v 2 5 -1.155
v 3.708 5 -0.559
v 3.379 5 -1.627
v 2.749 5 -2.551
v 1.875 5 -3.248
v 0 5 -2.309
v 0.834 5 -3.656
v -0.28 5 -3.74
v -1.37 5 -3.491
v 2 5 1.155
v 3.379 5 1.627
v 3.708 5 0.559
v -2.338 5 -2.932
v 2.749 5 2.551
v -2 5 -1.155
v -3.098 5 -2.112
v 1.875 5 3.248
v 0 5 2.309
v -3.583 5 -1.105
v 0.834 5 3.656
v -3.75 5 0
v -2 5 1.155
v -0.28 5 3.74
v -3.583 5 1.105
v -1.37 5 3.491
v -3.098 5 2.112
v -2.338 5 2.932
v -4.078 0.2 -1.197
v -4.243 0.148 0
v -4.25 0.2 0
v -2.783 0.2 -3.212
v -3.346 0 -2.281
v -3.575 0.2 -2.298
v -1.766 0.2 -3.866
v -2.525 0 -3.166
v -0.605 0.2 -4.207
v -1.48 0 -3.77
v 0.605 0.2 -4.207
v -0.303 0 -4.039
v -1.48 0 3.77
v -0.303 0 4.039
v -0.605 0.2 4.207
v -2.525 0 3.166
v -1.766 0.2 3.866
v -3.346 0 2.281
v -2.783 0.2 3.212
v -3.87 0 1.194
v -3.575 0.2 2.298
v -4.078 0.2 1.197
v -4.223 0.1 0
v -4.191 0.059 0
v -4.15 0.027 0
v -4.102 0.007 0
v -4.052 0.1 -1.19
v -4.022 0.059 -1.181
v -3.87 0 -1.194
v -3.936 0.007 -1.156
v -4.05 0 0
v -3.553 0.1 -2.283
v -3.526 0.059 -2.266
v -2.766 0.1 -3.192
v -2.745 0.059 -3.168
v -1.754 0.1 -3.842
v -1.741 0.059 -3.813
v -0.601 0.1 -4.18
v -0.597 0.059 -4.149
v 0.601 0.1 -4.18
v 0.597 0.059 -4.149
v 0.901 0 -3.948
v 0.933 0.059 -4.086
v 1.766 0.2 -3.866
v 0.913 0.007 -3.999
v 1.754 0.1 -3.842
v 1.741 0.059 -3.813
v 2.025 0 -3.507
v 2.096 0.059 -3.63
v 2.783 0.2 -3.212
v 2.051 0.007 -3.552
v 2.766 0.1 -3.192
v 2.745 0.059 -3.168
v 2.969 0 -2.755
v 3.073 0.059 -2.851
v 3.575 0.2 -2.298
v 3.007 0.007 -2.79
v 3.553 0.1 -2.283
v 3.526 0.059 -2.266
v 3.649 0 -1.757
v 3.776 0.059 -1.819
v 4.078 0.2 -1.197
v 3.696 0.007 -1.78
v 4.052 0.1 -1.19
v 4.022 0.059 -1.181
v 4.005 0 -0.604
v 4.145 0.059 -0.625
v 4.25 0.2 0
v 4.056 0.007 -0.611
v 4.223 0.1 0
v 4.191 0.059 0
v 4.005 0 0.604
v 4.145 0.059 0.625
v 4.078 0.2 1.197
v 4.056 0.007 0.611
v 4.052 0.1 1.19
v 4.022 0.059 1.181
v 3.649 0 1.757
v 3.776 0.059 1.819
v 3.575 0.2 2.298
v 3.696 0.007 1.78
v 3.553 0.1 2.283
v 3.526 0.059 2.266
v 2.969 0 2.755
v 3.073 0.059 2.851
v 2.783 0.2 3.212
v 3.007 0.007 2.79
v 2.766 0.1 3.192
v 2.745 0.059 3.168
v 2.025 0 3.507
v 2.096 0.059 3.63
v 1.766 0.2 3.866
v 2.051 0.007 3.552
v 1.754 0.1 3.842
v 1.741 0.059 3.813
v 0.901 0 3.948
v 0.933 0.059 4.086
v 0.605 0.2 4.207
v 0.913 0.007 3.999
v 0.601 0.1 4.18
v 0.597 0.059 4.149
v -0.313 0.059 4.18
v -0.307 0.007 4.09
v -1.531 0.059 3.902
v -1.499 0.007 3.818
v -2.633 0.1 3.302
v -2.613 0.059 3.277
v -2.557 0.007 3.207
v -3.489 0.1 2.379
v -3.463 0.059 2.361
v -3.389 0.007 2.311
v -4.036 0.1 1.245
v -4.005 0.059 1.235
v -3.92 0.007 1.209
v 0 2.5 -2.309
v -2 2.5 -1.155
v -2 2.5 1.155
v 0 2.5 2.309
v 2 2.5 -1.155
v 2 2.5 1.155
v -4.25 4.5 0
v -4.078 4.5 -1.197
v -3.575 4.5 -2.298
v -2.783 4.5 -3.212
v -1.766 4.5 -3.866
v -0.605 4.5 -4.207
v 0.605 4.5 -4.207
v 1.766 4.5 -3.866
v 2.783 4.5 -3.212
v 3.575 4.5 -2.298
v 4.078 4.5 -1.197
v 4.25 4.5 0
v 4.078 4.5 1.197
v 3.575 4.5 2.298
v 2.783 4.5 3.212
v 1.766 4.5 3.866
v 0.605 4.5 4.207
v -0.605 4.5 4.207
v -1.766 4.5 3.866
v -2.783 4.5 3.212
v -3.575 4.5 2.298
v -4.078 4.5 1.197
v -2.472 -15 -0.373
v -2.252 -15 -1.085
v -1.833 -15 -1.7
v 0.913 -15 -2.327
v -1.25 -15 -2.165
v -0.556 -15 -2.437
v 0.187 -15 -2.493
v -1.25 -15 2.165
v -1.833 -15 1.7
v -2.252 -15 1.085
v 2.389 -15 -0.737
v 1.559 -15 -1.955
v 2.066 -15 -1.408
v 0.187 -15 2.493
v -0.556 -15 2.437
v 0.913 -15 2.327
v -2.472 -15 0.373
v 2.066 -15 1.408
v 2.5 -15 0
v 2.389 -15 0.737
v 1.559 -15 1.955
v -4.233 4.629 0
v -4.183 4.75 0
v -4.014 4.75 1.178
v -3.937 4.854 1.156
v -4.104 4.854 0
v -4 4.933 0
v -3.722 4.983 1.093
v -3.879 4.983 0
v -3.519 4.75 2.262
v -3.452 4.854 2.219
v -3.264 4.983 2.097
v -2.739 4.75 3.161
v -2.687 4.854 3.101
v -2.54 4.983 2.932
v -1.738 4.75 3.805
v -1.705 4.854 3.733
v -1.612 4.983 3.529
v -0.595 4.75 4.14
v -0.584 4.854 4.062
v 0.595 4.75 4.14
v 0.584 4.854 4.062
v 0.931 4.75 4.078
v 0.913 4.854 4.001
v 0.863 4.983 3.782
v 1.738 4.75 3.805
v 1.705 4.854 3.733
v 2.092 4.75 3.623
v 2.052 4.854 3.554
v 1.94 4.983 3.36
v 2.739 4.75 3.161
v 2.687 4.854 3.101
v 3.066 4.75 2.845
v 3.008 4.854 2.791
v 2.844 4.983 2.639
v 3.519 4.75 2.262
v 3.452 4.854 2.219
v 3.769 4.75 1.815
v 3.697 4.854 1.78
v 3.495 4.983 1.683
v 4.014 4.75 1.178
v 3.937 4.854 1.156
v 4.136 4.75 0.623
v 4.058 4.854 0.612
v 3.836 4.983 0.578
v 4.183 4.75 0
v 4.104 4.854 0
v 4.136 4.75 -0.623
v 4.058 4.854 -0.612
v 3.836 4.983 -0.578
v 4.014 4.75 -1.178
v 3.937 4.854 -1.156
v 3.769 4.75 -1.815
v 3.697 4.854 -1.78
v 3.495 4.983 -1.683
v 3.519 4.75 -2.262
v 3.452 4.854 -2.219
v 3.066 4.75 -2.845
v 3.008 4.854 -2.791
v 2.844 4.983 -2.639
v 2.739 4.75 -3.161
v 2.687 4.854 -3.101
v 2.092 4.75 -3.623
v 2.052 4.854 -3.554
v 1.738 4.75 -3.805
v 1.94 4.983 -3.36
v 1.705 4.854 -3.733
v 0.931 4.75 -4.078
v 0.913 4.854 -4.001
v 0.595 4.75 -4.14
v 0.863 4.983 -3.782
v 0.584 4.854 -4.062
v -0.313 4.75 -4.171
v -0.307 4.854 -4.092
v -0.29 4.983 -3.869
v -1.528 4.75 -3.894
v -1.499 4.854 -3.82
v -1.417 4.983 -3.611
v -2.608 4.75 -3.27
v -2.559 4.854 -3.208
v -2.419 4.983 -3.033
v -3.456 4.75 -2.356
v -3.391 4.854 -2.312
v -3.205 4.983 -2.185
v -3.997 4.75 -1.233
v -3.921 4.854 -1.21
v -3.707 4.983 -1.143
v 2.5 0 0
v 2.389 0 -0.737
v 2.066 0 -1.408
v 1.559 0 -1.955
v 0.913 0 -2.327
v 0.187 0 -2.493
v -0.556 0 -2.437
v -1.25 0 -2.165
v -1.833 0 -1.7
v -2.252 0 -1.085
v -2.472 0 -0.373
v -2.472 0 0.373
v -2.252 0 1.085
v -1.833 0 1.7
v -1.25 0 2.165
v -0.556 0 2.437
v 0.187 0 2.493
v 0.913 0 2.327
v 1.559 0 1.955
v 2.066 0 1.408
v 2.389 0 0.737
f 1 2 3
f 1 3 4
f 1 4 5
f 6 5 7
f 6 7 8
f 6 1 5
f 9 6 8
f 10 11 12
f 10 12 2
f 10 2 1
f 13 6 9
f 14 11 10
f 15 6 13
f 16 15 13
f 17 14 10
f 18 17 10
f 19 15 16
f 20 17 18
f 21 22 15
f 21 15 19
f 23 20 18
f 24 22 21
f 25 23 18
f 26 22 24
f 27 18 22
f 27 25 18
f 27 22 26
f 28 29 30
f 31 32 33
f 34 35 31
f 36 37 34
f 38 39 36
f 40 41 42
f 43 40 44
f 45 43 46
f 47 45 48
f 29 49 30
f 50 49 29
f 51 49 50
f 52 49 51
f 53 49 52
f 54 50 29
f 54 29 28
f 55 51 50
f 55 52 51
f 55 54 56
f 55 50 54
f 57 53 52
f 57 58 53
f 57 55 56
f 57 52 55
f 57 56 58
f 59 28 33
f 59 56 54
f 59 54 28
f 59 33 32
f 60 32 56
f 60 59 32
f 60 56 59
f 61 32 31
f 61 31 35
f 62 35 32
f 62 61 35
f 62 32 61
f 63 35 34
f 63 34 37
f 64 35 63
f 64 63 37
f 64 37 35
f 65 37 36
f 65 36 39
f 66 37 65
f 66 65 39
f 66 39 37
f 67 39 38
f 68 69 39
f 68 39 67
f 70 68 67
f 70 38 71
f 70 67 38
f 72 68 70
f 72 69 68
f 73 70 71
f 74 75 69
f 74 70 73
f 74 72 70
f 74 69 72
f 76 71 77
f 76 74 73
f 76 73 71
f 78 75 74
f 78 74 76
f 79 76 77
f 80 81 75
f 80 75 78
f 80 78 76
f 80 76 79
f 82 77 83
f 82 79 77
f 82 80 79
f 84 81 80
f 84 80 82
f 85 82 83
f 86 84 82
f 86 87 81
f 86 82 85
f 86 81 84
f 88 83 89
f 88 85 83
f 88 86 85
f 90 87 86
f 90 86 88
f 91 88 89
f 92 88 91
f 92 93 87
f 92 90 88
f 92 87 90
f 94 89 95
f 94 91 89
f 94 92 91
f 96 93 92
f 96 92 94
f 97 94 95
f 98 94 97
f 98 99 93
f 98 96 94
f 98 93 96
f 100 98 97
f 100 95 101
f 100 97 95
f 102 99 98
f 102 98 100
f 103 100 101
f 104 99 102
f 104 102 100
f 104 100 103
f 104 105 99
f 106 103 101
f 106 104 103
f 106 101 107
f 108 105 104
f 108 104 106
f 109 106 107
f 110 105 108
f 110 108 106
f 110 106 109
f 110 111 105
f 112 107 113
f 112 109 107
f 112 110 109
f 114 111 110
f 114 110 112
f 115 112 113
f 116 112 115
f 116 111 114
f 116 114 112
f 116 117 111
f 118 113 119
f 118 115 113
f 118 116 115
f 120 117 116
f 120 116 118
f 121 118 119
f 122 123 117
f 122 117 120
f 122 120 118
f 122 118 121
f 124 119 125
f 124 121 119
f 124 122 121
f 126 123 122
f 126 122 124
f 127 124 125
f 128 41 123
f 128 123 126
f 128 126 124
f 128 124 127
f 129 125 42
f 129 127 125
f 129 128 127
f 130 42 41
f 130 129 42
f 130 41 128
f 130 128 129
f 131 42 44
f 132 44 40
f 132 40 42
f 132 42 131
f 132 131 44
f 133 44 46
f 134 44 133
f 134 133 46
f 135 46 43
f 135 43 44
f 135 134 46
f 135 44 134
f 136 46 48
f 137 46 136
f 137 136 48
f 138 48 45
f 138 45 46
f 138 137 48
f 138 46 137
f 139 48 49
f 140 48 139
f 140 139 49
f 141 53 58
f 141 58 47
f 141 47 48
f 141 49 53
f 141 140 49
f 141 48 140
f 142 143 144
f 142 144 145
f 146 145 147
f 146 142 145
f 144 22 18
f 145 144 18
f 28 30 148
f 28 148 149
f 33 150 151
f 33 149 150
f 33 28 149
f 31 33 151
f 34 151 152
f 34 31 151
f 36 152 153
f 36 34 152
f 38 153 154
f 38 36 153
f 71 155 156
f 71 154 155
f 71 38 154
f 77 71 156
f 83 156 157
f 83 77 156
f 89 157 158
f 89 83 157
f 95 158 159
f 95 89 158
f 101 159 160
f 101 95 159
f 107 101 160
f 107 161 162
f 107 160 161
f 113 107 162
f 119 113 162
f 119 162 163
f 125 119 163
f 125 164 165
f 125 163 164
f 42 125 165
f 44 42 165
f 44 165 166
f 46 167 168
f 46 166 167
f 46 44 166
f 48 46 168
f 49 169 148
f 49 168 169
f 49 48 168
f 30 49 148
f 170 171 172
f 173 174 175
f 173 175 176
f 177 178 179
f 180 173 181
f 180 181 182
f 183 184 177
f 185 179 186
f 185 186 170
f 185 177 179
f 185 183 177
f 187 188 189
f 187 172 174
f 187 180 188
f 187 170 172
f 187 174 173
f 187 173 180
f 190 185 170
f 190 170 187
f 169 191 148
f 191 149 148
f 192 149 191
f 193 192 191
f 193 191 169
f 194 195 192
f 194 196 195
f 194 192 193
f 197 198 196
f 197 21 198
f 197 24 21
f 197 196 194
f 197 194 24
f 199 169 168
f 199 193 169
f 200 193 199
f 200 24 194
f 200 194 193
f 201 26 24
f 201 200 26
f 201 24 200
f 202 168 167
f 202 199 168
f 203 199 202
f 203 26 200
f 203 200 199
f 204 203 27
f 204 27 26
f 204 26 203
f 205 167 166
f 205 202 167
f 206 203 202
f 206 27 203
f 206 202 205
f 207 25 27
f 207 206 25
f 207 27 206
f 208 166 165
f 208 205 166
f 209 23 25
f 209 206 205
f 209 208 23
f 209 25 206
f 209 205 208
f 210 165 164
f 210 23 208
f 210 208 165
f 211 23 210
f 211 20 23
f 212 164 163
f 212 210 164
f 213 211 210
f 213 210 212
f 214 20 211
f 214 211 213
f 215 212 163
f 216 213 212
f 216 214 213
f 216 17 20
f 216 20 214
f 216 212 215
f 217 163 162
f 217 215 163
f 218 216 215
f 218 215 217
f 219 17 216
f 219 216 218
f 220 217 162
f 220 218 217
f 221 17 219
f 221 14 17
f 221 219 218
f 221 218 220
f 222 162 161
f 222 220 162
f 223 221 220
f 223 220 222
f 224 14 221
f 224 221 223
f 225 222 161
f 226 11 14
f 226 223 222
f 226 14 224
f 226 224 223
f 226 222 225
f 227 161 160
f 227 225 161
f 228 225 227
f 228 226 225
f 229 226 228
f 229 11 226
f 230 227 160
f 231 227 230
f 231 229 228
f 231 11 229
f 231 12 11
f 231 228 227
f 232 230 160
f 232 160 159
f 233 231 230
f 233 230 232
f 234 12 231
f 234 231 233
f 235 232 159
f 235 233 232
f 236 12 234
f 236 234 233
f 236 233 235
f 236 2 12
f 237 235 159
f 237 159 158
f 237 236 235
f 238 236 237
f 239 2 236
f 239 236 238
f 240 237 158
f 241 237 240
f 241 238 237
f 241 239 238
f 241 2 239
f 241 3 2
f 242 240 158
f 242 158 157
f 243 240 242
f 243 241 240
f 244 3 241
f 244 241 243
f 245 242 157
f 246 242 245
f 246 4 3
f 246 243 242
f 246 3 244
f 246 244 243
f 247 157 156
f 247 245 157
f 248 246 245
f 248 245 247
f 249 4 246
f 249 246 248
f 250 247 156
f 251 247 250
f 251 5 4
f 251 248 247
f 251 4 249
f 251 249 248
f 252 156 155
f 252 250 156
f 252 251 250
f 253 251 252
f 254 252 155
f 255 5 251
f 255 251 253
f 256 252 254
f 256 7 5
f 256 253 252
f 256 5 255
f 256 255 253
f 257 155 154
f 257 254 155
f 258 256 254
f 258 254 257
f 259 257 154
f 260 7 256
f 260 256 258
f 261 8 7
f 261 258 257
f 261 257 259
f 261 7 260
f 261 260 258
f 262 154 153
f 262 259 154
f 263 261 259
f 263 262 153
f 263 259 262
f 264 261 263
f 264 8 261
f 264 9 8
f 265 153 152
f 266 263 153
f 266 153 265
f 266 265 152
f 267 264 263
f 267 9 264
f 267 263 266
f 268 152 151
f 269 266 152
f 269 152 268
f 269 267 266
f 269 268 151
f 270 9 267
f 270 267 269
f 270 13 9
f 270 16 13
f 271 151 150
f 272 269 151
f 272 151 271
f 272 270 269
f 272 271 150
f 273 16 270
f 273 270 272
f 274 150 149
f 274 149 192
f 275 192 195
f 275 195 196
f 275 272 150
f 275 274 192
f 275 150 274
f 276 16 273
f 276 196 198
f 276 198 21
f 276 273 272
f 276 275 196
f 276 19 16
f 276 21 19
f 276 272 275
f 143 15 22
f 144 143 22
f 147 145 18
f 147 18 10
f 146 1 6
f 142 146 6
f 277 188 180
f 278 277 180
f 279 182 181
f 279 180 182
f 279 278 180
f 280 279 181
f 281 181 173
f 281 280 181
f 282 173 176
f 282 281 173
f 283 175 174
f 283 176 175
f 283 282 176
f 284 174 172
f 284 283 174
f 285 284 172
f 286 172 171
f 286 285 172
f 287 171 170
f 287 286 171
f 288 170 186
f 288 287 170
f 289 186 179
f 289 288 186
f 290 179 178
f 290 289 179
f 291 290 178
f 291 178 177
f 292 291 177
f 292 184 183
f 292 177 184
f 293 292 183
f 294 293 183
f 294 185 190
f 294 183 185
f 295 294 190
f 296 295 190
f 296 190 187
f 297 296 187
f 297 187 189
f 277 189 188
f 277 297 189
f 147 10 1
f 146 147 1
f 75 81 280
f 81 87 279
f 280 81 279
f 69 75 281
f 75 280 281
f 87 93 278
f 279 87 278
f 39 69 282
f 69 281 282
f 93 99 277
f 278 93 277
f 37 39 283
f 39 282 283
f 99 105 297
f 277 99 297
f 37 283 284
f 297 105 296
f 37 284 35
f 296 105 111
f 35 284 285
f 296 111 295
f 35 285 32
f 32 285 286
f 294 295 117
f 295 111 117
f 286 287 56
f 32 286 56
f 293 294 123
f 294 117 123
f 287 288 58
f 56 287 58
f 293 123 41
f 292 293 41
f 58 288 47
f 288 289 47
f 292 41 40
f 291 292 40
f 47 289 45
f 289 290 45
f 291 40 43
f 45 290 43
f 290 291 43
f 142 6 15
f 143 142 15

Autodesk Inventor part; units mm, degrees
ref_plane "YZ Plane" through (0, 0, 0) normal (1, 0, 0) x (0, 1, 0)
ref_plane "XZ Plane" through (0, 0, 0) normal (0, 1, 0) x (-1, 0, 0)
ref_plane "XY Plane" through (0, 0, 0) normal (0, 0, 1) x (1, 0, 0)
sketch "スケッチ1" plane through (0, 0, 0) normal (0, 1, 0) x (-1, 0, 0)
  circle A0 centre (0, 0) radius 4.25
  dimension "d0" = 8.5
extrude "押し出し1" add sketch "スケッチ1" along normal blind 5
sketch "スケッチ2" plane through (0, 0, 0) normal (0, -1, 0) x (1, 0, 0)
  circle A0 centre (0, 0) radius 2.5
  dimension "d3" = 5
extrude "押し出し2" add sketch "スケッチ2" along normal blind 15
fillet "フィレット1" radius 0.5 1 edges at (4.25, 5, 0)
fillet "フィレット1" radius 0.2 1 edges at (4.25, 0, 0)
sketch "スケッチ3" plane through (0, 5, 0) normal (0, 1, 0) x (1, 0, 0)
  line L0 (0, 2.3094) -> (-2, 1.1547)
  line L1 (-2, 1.1547) -> (-2, -1.1547)
  line L2 (-2, -1.1547) -> (0, -2.3094)
  line L3 (0, -2.3094) -> (2, -1.1547)
  line L4 (2, -1.1547) -> (2, 1.1547)
  line L5 (2, 1.1547) -> (0, 2.3094)
  line L6 (0, 2.3094) -> (0, -2.3094) construction
  circle A0 centre (0, 0) radius 2.3094 construction
  dimension "d12" = 4
extrude "押し出し3" cut sketch "スケッチ3" against normal blind 2.5
thread "ねじ2" size "M5x0.8" class "6g" standard "ANSI Metric M Profile" length 15
properties part number "M3-CapScrew"
